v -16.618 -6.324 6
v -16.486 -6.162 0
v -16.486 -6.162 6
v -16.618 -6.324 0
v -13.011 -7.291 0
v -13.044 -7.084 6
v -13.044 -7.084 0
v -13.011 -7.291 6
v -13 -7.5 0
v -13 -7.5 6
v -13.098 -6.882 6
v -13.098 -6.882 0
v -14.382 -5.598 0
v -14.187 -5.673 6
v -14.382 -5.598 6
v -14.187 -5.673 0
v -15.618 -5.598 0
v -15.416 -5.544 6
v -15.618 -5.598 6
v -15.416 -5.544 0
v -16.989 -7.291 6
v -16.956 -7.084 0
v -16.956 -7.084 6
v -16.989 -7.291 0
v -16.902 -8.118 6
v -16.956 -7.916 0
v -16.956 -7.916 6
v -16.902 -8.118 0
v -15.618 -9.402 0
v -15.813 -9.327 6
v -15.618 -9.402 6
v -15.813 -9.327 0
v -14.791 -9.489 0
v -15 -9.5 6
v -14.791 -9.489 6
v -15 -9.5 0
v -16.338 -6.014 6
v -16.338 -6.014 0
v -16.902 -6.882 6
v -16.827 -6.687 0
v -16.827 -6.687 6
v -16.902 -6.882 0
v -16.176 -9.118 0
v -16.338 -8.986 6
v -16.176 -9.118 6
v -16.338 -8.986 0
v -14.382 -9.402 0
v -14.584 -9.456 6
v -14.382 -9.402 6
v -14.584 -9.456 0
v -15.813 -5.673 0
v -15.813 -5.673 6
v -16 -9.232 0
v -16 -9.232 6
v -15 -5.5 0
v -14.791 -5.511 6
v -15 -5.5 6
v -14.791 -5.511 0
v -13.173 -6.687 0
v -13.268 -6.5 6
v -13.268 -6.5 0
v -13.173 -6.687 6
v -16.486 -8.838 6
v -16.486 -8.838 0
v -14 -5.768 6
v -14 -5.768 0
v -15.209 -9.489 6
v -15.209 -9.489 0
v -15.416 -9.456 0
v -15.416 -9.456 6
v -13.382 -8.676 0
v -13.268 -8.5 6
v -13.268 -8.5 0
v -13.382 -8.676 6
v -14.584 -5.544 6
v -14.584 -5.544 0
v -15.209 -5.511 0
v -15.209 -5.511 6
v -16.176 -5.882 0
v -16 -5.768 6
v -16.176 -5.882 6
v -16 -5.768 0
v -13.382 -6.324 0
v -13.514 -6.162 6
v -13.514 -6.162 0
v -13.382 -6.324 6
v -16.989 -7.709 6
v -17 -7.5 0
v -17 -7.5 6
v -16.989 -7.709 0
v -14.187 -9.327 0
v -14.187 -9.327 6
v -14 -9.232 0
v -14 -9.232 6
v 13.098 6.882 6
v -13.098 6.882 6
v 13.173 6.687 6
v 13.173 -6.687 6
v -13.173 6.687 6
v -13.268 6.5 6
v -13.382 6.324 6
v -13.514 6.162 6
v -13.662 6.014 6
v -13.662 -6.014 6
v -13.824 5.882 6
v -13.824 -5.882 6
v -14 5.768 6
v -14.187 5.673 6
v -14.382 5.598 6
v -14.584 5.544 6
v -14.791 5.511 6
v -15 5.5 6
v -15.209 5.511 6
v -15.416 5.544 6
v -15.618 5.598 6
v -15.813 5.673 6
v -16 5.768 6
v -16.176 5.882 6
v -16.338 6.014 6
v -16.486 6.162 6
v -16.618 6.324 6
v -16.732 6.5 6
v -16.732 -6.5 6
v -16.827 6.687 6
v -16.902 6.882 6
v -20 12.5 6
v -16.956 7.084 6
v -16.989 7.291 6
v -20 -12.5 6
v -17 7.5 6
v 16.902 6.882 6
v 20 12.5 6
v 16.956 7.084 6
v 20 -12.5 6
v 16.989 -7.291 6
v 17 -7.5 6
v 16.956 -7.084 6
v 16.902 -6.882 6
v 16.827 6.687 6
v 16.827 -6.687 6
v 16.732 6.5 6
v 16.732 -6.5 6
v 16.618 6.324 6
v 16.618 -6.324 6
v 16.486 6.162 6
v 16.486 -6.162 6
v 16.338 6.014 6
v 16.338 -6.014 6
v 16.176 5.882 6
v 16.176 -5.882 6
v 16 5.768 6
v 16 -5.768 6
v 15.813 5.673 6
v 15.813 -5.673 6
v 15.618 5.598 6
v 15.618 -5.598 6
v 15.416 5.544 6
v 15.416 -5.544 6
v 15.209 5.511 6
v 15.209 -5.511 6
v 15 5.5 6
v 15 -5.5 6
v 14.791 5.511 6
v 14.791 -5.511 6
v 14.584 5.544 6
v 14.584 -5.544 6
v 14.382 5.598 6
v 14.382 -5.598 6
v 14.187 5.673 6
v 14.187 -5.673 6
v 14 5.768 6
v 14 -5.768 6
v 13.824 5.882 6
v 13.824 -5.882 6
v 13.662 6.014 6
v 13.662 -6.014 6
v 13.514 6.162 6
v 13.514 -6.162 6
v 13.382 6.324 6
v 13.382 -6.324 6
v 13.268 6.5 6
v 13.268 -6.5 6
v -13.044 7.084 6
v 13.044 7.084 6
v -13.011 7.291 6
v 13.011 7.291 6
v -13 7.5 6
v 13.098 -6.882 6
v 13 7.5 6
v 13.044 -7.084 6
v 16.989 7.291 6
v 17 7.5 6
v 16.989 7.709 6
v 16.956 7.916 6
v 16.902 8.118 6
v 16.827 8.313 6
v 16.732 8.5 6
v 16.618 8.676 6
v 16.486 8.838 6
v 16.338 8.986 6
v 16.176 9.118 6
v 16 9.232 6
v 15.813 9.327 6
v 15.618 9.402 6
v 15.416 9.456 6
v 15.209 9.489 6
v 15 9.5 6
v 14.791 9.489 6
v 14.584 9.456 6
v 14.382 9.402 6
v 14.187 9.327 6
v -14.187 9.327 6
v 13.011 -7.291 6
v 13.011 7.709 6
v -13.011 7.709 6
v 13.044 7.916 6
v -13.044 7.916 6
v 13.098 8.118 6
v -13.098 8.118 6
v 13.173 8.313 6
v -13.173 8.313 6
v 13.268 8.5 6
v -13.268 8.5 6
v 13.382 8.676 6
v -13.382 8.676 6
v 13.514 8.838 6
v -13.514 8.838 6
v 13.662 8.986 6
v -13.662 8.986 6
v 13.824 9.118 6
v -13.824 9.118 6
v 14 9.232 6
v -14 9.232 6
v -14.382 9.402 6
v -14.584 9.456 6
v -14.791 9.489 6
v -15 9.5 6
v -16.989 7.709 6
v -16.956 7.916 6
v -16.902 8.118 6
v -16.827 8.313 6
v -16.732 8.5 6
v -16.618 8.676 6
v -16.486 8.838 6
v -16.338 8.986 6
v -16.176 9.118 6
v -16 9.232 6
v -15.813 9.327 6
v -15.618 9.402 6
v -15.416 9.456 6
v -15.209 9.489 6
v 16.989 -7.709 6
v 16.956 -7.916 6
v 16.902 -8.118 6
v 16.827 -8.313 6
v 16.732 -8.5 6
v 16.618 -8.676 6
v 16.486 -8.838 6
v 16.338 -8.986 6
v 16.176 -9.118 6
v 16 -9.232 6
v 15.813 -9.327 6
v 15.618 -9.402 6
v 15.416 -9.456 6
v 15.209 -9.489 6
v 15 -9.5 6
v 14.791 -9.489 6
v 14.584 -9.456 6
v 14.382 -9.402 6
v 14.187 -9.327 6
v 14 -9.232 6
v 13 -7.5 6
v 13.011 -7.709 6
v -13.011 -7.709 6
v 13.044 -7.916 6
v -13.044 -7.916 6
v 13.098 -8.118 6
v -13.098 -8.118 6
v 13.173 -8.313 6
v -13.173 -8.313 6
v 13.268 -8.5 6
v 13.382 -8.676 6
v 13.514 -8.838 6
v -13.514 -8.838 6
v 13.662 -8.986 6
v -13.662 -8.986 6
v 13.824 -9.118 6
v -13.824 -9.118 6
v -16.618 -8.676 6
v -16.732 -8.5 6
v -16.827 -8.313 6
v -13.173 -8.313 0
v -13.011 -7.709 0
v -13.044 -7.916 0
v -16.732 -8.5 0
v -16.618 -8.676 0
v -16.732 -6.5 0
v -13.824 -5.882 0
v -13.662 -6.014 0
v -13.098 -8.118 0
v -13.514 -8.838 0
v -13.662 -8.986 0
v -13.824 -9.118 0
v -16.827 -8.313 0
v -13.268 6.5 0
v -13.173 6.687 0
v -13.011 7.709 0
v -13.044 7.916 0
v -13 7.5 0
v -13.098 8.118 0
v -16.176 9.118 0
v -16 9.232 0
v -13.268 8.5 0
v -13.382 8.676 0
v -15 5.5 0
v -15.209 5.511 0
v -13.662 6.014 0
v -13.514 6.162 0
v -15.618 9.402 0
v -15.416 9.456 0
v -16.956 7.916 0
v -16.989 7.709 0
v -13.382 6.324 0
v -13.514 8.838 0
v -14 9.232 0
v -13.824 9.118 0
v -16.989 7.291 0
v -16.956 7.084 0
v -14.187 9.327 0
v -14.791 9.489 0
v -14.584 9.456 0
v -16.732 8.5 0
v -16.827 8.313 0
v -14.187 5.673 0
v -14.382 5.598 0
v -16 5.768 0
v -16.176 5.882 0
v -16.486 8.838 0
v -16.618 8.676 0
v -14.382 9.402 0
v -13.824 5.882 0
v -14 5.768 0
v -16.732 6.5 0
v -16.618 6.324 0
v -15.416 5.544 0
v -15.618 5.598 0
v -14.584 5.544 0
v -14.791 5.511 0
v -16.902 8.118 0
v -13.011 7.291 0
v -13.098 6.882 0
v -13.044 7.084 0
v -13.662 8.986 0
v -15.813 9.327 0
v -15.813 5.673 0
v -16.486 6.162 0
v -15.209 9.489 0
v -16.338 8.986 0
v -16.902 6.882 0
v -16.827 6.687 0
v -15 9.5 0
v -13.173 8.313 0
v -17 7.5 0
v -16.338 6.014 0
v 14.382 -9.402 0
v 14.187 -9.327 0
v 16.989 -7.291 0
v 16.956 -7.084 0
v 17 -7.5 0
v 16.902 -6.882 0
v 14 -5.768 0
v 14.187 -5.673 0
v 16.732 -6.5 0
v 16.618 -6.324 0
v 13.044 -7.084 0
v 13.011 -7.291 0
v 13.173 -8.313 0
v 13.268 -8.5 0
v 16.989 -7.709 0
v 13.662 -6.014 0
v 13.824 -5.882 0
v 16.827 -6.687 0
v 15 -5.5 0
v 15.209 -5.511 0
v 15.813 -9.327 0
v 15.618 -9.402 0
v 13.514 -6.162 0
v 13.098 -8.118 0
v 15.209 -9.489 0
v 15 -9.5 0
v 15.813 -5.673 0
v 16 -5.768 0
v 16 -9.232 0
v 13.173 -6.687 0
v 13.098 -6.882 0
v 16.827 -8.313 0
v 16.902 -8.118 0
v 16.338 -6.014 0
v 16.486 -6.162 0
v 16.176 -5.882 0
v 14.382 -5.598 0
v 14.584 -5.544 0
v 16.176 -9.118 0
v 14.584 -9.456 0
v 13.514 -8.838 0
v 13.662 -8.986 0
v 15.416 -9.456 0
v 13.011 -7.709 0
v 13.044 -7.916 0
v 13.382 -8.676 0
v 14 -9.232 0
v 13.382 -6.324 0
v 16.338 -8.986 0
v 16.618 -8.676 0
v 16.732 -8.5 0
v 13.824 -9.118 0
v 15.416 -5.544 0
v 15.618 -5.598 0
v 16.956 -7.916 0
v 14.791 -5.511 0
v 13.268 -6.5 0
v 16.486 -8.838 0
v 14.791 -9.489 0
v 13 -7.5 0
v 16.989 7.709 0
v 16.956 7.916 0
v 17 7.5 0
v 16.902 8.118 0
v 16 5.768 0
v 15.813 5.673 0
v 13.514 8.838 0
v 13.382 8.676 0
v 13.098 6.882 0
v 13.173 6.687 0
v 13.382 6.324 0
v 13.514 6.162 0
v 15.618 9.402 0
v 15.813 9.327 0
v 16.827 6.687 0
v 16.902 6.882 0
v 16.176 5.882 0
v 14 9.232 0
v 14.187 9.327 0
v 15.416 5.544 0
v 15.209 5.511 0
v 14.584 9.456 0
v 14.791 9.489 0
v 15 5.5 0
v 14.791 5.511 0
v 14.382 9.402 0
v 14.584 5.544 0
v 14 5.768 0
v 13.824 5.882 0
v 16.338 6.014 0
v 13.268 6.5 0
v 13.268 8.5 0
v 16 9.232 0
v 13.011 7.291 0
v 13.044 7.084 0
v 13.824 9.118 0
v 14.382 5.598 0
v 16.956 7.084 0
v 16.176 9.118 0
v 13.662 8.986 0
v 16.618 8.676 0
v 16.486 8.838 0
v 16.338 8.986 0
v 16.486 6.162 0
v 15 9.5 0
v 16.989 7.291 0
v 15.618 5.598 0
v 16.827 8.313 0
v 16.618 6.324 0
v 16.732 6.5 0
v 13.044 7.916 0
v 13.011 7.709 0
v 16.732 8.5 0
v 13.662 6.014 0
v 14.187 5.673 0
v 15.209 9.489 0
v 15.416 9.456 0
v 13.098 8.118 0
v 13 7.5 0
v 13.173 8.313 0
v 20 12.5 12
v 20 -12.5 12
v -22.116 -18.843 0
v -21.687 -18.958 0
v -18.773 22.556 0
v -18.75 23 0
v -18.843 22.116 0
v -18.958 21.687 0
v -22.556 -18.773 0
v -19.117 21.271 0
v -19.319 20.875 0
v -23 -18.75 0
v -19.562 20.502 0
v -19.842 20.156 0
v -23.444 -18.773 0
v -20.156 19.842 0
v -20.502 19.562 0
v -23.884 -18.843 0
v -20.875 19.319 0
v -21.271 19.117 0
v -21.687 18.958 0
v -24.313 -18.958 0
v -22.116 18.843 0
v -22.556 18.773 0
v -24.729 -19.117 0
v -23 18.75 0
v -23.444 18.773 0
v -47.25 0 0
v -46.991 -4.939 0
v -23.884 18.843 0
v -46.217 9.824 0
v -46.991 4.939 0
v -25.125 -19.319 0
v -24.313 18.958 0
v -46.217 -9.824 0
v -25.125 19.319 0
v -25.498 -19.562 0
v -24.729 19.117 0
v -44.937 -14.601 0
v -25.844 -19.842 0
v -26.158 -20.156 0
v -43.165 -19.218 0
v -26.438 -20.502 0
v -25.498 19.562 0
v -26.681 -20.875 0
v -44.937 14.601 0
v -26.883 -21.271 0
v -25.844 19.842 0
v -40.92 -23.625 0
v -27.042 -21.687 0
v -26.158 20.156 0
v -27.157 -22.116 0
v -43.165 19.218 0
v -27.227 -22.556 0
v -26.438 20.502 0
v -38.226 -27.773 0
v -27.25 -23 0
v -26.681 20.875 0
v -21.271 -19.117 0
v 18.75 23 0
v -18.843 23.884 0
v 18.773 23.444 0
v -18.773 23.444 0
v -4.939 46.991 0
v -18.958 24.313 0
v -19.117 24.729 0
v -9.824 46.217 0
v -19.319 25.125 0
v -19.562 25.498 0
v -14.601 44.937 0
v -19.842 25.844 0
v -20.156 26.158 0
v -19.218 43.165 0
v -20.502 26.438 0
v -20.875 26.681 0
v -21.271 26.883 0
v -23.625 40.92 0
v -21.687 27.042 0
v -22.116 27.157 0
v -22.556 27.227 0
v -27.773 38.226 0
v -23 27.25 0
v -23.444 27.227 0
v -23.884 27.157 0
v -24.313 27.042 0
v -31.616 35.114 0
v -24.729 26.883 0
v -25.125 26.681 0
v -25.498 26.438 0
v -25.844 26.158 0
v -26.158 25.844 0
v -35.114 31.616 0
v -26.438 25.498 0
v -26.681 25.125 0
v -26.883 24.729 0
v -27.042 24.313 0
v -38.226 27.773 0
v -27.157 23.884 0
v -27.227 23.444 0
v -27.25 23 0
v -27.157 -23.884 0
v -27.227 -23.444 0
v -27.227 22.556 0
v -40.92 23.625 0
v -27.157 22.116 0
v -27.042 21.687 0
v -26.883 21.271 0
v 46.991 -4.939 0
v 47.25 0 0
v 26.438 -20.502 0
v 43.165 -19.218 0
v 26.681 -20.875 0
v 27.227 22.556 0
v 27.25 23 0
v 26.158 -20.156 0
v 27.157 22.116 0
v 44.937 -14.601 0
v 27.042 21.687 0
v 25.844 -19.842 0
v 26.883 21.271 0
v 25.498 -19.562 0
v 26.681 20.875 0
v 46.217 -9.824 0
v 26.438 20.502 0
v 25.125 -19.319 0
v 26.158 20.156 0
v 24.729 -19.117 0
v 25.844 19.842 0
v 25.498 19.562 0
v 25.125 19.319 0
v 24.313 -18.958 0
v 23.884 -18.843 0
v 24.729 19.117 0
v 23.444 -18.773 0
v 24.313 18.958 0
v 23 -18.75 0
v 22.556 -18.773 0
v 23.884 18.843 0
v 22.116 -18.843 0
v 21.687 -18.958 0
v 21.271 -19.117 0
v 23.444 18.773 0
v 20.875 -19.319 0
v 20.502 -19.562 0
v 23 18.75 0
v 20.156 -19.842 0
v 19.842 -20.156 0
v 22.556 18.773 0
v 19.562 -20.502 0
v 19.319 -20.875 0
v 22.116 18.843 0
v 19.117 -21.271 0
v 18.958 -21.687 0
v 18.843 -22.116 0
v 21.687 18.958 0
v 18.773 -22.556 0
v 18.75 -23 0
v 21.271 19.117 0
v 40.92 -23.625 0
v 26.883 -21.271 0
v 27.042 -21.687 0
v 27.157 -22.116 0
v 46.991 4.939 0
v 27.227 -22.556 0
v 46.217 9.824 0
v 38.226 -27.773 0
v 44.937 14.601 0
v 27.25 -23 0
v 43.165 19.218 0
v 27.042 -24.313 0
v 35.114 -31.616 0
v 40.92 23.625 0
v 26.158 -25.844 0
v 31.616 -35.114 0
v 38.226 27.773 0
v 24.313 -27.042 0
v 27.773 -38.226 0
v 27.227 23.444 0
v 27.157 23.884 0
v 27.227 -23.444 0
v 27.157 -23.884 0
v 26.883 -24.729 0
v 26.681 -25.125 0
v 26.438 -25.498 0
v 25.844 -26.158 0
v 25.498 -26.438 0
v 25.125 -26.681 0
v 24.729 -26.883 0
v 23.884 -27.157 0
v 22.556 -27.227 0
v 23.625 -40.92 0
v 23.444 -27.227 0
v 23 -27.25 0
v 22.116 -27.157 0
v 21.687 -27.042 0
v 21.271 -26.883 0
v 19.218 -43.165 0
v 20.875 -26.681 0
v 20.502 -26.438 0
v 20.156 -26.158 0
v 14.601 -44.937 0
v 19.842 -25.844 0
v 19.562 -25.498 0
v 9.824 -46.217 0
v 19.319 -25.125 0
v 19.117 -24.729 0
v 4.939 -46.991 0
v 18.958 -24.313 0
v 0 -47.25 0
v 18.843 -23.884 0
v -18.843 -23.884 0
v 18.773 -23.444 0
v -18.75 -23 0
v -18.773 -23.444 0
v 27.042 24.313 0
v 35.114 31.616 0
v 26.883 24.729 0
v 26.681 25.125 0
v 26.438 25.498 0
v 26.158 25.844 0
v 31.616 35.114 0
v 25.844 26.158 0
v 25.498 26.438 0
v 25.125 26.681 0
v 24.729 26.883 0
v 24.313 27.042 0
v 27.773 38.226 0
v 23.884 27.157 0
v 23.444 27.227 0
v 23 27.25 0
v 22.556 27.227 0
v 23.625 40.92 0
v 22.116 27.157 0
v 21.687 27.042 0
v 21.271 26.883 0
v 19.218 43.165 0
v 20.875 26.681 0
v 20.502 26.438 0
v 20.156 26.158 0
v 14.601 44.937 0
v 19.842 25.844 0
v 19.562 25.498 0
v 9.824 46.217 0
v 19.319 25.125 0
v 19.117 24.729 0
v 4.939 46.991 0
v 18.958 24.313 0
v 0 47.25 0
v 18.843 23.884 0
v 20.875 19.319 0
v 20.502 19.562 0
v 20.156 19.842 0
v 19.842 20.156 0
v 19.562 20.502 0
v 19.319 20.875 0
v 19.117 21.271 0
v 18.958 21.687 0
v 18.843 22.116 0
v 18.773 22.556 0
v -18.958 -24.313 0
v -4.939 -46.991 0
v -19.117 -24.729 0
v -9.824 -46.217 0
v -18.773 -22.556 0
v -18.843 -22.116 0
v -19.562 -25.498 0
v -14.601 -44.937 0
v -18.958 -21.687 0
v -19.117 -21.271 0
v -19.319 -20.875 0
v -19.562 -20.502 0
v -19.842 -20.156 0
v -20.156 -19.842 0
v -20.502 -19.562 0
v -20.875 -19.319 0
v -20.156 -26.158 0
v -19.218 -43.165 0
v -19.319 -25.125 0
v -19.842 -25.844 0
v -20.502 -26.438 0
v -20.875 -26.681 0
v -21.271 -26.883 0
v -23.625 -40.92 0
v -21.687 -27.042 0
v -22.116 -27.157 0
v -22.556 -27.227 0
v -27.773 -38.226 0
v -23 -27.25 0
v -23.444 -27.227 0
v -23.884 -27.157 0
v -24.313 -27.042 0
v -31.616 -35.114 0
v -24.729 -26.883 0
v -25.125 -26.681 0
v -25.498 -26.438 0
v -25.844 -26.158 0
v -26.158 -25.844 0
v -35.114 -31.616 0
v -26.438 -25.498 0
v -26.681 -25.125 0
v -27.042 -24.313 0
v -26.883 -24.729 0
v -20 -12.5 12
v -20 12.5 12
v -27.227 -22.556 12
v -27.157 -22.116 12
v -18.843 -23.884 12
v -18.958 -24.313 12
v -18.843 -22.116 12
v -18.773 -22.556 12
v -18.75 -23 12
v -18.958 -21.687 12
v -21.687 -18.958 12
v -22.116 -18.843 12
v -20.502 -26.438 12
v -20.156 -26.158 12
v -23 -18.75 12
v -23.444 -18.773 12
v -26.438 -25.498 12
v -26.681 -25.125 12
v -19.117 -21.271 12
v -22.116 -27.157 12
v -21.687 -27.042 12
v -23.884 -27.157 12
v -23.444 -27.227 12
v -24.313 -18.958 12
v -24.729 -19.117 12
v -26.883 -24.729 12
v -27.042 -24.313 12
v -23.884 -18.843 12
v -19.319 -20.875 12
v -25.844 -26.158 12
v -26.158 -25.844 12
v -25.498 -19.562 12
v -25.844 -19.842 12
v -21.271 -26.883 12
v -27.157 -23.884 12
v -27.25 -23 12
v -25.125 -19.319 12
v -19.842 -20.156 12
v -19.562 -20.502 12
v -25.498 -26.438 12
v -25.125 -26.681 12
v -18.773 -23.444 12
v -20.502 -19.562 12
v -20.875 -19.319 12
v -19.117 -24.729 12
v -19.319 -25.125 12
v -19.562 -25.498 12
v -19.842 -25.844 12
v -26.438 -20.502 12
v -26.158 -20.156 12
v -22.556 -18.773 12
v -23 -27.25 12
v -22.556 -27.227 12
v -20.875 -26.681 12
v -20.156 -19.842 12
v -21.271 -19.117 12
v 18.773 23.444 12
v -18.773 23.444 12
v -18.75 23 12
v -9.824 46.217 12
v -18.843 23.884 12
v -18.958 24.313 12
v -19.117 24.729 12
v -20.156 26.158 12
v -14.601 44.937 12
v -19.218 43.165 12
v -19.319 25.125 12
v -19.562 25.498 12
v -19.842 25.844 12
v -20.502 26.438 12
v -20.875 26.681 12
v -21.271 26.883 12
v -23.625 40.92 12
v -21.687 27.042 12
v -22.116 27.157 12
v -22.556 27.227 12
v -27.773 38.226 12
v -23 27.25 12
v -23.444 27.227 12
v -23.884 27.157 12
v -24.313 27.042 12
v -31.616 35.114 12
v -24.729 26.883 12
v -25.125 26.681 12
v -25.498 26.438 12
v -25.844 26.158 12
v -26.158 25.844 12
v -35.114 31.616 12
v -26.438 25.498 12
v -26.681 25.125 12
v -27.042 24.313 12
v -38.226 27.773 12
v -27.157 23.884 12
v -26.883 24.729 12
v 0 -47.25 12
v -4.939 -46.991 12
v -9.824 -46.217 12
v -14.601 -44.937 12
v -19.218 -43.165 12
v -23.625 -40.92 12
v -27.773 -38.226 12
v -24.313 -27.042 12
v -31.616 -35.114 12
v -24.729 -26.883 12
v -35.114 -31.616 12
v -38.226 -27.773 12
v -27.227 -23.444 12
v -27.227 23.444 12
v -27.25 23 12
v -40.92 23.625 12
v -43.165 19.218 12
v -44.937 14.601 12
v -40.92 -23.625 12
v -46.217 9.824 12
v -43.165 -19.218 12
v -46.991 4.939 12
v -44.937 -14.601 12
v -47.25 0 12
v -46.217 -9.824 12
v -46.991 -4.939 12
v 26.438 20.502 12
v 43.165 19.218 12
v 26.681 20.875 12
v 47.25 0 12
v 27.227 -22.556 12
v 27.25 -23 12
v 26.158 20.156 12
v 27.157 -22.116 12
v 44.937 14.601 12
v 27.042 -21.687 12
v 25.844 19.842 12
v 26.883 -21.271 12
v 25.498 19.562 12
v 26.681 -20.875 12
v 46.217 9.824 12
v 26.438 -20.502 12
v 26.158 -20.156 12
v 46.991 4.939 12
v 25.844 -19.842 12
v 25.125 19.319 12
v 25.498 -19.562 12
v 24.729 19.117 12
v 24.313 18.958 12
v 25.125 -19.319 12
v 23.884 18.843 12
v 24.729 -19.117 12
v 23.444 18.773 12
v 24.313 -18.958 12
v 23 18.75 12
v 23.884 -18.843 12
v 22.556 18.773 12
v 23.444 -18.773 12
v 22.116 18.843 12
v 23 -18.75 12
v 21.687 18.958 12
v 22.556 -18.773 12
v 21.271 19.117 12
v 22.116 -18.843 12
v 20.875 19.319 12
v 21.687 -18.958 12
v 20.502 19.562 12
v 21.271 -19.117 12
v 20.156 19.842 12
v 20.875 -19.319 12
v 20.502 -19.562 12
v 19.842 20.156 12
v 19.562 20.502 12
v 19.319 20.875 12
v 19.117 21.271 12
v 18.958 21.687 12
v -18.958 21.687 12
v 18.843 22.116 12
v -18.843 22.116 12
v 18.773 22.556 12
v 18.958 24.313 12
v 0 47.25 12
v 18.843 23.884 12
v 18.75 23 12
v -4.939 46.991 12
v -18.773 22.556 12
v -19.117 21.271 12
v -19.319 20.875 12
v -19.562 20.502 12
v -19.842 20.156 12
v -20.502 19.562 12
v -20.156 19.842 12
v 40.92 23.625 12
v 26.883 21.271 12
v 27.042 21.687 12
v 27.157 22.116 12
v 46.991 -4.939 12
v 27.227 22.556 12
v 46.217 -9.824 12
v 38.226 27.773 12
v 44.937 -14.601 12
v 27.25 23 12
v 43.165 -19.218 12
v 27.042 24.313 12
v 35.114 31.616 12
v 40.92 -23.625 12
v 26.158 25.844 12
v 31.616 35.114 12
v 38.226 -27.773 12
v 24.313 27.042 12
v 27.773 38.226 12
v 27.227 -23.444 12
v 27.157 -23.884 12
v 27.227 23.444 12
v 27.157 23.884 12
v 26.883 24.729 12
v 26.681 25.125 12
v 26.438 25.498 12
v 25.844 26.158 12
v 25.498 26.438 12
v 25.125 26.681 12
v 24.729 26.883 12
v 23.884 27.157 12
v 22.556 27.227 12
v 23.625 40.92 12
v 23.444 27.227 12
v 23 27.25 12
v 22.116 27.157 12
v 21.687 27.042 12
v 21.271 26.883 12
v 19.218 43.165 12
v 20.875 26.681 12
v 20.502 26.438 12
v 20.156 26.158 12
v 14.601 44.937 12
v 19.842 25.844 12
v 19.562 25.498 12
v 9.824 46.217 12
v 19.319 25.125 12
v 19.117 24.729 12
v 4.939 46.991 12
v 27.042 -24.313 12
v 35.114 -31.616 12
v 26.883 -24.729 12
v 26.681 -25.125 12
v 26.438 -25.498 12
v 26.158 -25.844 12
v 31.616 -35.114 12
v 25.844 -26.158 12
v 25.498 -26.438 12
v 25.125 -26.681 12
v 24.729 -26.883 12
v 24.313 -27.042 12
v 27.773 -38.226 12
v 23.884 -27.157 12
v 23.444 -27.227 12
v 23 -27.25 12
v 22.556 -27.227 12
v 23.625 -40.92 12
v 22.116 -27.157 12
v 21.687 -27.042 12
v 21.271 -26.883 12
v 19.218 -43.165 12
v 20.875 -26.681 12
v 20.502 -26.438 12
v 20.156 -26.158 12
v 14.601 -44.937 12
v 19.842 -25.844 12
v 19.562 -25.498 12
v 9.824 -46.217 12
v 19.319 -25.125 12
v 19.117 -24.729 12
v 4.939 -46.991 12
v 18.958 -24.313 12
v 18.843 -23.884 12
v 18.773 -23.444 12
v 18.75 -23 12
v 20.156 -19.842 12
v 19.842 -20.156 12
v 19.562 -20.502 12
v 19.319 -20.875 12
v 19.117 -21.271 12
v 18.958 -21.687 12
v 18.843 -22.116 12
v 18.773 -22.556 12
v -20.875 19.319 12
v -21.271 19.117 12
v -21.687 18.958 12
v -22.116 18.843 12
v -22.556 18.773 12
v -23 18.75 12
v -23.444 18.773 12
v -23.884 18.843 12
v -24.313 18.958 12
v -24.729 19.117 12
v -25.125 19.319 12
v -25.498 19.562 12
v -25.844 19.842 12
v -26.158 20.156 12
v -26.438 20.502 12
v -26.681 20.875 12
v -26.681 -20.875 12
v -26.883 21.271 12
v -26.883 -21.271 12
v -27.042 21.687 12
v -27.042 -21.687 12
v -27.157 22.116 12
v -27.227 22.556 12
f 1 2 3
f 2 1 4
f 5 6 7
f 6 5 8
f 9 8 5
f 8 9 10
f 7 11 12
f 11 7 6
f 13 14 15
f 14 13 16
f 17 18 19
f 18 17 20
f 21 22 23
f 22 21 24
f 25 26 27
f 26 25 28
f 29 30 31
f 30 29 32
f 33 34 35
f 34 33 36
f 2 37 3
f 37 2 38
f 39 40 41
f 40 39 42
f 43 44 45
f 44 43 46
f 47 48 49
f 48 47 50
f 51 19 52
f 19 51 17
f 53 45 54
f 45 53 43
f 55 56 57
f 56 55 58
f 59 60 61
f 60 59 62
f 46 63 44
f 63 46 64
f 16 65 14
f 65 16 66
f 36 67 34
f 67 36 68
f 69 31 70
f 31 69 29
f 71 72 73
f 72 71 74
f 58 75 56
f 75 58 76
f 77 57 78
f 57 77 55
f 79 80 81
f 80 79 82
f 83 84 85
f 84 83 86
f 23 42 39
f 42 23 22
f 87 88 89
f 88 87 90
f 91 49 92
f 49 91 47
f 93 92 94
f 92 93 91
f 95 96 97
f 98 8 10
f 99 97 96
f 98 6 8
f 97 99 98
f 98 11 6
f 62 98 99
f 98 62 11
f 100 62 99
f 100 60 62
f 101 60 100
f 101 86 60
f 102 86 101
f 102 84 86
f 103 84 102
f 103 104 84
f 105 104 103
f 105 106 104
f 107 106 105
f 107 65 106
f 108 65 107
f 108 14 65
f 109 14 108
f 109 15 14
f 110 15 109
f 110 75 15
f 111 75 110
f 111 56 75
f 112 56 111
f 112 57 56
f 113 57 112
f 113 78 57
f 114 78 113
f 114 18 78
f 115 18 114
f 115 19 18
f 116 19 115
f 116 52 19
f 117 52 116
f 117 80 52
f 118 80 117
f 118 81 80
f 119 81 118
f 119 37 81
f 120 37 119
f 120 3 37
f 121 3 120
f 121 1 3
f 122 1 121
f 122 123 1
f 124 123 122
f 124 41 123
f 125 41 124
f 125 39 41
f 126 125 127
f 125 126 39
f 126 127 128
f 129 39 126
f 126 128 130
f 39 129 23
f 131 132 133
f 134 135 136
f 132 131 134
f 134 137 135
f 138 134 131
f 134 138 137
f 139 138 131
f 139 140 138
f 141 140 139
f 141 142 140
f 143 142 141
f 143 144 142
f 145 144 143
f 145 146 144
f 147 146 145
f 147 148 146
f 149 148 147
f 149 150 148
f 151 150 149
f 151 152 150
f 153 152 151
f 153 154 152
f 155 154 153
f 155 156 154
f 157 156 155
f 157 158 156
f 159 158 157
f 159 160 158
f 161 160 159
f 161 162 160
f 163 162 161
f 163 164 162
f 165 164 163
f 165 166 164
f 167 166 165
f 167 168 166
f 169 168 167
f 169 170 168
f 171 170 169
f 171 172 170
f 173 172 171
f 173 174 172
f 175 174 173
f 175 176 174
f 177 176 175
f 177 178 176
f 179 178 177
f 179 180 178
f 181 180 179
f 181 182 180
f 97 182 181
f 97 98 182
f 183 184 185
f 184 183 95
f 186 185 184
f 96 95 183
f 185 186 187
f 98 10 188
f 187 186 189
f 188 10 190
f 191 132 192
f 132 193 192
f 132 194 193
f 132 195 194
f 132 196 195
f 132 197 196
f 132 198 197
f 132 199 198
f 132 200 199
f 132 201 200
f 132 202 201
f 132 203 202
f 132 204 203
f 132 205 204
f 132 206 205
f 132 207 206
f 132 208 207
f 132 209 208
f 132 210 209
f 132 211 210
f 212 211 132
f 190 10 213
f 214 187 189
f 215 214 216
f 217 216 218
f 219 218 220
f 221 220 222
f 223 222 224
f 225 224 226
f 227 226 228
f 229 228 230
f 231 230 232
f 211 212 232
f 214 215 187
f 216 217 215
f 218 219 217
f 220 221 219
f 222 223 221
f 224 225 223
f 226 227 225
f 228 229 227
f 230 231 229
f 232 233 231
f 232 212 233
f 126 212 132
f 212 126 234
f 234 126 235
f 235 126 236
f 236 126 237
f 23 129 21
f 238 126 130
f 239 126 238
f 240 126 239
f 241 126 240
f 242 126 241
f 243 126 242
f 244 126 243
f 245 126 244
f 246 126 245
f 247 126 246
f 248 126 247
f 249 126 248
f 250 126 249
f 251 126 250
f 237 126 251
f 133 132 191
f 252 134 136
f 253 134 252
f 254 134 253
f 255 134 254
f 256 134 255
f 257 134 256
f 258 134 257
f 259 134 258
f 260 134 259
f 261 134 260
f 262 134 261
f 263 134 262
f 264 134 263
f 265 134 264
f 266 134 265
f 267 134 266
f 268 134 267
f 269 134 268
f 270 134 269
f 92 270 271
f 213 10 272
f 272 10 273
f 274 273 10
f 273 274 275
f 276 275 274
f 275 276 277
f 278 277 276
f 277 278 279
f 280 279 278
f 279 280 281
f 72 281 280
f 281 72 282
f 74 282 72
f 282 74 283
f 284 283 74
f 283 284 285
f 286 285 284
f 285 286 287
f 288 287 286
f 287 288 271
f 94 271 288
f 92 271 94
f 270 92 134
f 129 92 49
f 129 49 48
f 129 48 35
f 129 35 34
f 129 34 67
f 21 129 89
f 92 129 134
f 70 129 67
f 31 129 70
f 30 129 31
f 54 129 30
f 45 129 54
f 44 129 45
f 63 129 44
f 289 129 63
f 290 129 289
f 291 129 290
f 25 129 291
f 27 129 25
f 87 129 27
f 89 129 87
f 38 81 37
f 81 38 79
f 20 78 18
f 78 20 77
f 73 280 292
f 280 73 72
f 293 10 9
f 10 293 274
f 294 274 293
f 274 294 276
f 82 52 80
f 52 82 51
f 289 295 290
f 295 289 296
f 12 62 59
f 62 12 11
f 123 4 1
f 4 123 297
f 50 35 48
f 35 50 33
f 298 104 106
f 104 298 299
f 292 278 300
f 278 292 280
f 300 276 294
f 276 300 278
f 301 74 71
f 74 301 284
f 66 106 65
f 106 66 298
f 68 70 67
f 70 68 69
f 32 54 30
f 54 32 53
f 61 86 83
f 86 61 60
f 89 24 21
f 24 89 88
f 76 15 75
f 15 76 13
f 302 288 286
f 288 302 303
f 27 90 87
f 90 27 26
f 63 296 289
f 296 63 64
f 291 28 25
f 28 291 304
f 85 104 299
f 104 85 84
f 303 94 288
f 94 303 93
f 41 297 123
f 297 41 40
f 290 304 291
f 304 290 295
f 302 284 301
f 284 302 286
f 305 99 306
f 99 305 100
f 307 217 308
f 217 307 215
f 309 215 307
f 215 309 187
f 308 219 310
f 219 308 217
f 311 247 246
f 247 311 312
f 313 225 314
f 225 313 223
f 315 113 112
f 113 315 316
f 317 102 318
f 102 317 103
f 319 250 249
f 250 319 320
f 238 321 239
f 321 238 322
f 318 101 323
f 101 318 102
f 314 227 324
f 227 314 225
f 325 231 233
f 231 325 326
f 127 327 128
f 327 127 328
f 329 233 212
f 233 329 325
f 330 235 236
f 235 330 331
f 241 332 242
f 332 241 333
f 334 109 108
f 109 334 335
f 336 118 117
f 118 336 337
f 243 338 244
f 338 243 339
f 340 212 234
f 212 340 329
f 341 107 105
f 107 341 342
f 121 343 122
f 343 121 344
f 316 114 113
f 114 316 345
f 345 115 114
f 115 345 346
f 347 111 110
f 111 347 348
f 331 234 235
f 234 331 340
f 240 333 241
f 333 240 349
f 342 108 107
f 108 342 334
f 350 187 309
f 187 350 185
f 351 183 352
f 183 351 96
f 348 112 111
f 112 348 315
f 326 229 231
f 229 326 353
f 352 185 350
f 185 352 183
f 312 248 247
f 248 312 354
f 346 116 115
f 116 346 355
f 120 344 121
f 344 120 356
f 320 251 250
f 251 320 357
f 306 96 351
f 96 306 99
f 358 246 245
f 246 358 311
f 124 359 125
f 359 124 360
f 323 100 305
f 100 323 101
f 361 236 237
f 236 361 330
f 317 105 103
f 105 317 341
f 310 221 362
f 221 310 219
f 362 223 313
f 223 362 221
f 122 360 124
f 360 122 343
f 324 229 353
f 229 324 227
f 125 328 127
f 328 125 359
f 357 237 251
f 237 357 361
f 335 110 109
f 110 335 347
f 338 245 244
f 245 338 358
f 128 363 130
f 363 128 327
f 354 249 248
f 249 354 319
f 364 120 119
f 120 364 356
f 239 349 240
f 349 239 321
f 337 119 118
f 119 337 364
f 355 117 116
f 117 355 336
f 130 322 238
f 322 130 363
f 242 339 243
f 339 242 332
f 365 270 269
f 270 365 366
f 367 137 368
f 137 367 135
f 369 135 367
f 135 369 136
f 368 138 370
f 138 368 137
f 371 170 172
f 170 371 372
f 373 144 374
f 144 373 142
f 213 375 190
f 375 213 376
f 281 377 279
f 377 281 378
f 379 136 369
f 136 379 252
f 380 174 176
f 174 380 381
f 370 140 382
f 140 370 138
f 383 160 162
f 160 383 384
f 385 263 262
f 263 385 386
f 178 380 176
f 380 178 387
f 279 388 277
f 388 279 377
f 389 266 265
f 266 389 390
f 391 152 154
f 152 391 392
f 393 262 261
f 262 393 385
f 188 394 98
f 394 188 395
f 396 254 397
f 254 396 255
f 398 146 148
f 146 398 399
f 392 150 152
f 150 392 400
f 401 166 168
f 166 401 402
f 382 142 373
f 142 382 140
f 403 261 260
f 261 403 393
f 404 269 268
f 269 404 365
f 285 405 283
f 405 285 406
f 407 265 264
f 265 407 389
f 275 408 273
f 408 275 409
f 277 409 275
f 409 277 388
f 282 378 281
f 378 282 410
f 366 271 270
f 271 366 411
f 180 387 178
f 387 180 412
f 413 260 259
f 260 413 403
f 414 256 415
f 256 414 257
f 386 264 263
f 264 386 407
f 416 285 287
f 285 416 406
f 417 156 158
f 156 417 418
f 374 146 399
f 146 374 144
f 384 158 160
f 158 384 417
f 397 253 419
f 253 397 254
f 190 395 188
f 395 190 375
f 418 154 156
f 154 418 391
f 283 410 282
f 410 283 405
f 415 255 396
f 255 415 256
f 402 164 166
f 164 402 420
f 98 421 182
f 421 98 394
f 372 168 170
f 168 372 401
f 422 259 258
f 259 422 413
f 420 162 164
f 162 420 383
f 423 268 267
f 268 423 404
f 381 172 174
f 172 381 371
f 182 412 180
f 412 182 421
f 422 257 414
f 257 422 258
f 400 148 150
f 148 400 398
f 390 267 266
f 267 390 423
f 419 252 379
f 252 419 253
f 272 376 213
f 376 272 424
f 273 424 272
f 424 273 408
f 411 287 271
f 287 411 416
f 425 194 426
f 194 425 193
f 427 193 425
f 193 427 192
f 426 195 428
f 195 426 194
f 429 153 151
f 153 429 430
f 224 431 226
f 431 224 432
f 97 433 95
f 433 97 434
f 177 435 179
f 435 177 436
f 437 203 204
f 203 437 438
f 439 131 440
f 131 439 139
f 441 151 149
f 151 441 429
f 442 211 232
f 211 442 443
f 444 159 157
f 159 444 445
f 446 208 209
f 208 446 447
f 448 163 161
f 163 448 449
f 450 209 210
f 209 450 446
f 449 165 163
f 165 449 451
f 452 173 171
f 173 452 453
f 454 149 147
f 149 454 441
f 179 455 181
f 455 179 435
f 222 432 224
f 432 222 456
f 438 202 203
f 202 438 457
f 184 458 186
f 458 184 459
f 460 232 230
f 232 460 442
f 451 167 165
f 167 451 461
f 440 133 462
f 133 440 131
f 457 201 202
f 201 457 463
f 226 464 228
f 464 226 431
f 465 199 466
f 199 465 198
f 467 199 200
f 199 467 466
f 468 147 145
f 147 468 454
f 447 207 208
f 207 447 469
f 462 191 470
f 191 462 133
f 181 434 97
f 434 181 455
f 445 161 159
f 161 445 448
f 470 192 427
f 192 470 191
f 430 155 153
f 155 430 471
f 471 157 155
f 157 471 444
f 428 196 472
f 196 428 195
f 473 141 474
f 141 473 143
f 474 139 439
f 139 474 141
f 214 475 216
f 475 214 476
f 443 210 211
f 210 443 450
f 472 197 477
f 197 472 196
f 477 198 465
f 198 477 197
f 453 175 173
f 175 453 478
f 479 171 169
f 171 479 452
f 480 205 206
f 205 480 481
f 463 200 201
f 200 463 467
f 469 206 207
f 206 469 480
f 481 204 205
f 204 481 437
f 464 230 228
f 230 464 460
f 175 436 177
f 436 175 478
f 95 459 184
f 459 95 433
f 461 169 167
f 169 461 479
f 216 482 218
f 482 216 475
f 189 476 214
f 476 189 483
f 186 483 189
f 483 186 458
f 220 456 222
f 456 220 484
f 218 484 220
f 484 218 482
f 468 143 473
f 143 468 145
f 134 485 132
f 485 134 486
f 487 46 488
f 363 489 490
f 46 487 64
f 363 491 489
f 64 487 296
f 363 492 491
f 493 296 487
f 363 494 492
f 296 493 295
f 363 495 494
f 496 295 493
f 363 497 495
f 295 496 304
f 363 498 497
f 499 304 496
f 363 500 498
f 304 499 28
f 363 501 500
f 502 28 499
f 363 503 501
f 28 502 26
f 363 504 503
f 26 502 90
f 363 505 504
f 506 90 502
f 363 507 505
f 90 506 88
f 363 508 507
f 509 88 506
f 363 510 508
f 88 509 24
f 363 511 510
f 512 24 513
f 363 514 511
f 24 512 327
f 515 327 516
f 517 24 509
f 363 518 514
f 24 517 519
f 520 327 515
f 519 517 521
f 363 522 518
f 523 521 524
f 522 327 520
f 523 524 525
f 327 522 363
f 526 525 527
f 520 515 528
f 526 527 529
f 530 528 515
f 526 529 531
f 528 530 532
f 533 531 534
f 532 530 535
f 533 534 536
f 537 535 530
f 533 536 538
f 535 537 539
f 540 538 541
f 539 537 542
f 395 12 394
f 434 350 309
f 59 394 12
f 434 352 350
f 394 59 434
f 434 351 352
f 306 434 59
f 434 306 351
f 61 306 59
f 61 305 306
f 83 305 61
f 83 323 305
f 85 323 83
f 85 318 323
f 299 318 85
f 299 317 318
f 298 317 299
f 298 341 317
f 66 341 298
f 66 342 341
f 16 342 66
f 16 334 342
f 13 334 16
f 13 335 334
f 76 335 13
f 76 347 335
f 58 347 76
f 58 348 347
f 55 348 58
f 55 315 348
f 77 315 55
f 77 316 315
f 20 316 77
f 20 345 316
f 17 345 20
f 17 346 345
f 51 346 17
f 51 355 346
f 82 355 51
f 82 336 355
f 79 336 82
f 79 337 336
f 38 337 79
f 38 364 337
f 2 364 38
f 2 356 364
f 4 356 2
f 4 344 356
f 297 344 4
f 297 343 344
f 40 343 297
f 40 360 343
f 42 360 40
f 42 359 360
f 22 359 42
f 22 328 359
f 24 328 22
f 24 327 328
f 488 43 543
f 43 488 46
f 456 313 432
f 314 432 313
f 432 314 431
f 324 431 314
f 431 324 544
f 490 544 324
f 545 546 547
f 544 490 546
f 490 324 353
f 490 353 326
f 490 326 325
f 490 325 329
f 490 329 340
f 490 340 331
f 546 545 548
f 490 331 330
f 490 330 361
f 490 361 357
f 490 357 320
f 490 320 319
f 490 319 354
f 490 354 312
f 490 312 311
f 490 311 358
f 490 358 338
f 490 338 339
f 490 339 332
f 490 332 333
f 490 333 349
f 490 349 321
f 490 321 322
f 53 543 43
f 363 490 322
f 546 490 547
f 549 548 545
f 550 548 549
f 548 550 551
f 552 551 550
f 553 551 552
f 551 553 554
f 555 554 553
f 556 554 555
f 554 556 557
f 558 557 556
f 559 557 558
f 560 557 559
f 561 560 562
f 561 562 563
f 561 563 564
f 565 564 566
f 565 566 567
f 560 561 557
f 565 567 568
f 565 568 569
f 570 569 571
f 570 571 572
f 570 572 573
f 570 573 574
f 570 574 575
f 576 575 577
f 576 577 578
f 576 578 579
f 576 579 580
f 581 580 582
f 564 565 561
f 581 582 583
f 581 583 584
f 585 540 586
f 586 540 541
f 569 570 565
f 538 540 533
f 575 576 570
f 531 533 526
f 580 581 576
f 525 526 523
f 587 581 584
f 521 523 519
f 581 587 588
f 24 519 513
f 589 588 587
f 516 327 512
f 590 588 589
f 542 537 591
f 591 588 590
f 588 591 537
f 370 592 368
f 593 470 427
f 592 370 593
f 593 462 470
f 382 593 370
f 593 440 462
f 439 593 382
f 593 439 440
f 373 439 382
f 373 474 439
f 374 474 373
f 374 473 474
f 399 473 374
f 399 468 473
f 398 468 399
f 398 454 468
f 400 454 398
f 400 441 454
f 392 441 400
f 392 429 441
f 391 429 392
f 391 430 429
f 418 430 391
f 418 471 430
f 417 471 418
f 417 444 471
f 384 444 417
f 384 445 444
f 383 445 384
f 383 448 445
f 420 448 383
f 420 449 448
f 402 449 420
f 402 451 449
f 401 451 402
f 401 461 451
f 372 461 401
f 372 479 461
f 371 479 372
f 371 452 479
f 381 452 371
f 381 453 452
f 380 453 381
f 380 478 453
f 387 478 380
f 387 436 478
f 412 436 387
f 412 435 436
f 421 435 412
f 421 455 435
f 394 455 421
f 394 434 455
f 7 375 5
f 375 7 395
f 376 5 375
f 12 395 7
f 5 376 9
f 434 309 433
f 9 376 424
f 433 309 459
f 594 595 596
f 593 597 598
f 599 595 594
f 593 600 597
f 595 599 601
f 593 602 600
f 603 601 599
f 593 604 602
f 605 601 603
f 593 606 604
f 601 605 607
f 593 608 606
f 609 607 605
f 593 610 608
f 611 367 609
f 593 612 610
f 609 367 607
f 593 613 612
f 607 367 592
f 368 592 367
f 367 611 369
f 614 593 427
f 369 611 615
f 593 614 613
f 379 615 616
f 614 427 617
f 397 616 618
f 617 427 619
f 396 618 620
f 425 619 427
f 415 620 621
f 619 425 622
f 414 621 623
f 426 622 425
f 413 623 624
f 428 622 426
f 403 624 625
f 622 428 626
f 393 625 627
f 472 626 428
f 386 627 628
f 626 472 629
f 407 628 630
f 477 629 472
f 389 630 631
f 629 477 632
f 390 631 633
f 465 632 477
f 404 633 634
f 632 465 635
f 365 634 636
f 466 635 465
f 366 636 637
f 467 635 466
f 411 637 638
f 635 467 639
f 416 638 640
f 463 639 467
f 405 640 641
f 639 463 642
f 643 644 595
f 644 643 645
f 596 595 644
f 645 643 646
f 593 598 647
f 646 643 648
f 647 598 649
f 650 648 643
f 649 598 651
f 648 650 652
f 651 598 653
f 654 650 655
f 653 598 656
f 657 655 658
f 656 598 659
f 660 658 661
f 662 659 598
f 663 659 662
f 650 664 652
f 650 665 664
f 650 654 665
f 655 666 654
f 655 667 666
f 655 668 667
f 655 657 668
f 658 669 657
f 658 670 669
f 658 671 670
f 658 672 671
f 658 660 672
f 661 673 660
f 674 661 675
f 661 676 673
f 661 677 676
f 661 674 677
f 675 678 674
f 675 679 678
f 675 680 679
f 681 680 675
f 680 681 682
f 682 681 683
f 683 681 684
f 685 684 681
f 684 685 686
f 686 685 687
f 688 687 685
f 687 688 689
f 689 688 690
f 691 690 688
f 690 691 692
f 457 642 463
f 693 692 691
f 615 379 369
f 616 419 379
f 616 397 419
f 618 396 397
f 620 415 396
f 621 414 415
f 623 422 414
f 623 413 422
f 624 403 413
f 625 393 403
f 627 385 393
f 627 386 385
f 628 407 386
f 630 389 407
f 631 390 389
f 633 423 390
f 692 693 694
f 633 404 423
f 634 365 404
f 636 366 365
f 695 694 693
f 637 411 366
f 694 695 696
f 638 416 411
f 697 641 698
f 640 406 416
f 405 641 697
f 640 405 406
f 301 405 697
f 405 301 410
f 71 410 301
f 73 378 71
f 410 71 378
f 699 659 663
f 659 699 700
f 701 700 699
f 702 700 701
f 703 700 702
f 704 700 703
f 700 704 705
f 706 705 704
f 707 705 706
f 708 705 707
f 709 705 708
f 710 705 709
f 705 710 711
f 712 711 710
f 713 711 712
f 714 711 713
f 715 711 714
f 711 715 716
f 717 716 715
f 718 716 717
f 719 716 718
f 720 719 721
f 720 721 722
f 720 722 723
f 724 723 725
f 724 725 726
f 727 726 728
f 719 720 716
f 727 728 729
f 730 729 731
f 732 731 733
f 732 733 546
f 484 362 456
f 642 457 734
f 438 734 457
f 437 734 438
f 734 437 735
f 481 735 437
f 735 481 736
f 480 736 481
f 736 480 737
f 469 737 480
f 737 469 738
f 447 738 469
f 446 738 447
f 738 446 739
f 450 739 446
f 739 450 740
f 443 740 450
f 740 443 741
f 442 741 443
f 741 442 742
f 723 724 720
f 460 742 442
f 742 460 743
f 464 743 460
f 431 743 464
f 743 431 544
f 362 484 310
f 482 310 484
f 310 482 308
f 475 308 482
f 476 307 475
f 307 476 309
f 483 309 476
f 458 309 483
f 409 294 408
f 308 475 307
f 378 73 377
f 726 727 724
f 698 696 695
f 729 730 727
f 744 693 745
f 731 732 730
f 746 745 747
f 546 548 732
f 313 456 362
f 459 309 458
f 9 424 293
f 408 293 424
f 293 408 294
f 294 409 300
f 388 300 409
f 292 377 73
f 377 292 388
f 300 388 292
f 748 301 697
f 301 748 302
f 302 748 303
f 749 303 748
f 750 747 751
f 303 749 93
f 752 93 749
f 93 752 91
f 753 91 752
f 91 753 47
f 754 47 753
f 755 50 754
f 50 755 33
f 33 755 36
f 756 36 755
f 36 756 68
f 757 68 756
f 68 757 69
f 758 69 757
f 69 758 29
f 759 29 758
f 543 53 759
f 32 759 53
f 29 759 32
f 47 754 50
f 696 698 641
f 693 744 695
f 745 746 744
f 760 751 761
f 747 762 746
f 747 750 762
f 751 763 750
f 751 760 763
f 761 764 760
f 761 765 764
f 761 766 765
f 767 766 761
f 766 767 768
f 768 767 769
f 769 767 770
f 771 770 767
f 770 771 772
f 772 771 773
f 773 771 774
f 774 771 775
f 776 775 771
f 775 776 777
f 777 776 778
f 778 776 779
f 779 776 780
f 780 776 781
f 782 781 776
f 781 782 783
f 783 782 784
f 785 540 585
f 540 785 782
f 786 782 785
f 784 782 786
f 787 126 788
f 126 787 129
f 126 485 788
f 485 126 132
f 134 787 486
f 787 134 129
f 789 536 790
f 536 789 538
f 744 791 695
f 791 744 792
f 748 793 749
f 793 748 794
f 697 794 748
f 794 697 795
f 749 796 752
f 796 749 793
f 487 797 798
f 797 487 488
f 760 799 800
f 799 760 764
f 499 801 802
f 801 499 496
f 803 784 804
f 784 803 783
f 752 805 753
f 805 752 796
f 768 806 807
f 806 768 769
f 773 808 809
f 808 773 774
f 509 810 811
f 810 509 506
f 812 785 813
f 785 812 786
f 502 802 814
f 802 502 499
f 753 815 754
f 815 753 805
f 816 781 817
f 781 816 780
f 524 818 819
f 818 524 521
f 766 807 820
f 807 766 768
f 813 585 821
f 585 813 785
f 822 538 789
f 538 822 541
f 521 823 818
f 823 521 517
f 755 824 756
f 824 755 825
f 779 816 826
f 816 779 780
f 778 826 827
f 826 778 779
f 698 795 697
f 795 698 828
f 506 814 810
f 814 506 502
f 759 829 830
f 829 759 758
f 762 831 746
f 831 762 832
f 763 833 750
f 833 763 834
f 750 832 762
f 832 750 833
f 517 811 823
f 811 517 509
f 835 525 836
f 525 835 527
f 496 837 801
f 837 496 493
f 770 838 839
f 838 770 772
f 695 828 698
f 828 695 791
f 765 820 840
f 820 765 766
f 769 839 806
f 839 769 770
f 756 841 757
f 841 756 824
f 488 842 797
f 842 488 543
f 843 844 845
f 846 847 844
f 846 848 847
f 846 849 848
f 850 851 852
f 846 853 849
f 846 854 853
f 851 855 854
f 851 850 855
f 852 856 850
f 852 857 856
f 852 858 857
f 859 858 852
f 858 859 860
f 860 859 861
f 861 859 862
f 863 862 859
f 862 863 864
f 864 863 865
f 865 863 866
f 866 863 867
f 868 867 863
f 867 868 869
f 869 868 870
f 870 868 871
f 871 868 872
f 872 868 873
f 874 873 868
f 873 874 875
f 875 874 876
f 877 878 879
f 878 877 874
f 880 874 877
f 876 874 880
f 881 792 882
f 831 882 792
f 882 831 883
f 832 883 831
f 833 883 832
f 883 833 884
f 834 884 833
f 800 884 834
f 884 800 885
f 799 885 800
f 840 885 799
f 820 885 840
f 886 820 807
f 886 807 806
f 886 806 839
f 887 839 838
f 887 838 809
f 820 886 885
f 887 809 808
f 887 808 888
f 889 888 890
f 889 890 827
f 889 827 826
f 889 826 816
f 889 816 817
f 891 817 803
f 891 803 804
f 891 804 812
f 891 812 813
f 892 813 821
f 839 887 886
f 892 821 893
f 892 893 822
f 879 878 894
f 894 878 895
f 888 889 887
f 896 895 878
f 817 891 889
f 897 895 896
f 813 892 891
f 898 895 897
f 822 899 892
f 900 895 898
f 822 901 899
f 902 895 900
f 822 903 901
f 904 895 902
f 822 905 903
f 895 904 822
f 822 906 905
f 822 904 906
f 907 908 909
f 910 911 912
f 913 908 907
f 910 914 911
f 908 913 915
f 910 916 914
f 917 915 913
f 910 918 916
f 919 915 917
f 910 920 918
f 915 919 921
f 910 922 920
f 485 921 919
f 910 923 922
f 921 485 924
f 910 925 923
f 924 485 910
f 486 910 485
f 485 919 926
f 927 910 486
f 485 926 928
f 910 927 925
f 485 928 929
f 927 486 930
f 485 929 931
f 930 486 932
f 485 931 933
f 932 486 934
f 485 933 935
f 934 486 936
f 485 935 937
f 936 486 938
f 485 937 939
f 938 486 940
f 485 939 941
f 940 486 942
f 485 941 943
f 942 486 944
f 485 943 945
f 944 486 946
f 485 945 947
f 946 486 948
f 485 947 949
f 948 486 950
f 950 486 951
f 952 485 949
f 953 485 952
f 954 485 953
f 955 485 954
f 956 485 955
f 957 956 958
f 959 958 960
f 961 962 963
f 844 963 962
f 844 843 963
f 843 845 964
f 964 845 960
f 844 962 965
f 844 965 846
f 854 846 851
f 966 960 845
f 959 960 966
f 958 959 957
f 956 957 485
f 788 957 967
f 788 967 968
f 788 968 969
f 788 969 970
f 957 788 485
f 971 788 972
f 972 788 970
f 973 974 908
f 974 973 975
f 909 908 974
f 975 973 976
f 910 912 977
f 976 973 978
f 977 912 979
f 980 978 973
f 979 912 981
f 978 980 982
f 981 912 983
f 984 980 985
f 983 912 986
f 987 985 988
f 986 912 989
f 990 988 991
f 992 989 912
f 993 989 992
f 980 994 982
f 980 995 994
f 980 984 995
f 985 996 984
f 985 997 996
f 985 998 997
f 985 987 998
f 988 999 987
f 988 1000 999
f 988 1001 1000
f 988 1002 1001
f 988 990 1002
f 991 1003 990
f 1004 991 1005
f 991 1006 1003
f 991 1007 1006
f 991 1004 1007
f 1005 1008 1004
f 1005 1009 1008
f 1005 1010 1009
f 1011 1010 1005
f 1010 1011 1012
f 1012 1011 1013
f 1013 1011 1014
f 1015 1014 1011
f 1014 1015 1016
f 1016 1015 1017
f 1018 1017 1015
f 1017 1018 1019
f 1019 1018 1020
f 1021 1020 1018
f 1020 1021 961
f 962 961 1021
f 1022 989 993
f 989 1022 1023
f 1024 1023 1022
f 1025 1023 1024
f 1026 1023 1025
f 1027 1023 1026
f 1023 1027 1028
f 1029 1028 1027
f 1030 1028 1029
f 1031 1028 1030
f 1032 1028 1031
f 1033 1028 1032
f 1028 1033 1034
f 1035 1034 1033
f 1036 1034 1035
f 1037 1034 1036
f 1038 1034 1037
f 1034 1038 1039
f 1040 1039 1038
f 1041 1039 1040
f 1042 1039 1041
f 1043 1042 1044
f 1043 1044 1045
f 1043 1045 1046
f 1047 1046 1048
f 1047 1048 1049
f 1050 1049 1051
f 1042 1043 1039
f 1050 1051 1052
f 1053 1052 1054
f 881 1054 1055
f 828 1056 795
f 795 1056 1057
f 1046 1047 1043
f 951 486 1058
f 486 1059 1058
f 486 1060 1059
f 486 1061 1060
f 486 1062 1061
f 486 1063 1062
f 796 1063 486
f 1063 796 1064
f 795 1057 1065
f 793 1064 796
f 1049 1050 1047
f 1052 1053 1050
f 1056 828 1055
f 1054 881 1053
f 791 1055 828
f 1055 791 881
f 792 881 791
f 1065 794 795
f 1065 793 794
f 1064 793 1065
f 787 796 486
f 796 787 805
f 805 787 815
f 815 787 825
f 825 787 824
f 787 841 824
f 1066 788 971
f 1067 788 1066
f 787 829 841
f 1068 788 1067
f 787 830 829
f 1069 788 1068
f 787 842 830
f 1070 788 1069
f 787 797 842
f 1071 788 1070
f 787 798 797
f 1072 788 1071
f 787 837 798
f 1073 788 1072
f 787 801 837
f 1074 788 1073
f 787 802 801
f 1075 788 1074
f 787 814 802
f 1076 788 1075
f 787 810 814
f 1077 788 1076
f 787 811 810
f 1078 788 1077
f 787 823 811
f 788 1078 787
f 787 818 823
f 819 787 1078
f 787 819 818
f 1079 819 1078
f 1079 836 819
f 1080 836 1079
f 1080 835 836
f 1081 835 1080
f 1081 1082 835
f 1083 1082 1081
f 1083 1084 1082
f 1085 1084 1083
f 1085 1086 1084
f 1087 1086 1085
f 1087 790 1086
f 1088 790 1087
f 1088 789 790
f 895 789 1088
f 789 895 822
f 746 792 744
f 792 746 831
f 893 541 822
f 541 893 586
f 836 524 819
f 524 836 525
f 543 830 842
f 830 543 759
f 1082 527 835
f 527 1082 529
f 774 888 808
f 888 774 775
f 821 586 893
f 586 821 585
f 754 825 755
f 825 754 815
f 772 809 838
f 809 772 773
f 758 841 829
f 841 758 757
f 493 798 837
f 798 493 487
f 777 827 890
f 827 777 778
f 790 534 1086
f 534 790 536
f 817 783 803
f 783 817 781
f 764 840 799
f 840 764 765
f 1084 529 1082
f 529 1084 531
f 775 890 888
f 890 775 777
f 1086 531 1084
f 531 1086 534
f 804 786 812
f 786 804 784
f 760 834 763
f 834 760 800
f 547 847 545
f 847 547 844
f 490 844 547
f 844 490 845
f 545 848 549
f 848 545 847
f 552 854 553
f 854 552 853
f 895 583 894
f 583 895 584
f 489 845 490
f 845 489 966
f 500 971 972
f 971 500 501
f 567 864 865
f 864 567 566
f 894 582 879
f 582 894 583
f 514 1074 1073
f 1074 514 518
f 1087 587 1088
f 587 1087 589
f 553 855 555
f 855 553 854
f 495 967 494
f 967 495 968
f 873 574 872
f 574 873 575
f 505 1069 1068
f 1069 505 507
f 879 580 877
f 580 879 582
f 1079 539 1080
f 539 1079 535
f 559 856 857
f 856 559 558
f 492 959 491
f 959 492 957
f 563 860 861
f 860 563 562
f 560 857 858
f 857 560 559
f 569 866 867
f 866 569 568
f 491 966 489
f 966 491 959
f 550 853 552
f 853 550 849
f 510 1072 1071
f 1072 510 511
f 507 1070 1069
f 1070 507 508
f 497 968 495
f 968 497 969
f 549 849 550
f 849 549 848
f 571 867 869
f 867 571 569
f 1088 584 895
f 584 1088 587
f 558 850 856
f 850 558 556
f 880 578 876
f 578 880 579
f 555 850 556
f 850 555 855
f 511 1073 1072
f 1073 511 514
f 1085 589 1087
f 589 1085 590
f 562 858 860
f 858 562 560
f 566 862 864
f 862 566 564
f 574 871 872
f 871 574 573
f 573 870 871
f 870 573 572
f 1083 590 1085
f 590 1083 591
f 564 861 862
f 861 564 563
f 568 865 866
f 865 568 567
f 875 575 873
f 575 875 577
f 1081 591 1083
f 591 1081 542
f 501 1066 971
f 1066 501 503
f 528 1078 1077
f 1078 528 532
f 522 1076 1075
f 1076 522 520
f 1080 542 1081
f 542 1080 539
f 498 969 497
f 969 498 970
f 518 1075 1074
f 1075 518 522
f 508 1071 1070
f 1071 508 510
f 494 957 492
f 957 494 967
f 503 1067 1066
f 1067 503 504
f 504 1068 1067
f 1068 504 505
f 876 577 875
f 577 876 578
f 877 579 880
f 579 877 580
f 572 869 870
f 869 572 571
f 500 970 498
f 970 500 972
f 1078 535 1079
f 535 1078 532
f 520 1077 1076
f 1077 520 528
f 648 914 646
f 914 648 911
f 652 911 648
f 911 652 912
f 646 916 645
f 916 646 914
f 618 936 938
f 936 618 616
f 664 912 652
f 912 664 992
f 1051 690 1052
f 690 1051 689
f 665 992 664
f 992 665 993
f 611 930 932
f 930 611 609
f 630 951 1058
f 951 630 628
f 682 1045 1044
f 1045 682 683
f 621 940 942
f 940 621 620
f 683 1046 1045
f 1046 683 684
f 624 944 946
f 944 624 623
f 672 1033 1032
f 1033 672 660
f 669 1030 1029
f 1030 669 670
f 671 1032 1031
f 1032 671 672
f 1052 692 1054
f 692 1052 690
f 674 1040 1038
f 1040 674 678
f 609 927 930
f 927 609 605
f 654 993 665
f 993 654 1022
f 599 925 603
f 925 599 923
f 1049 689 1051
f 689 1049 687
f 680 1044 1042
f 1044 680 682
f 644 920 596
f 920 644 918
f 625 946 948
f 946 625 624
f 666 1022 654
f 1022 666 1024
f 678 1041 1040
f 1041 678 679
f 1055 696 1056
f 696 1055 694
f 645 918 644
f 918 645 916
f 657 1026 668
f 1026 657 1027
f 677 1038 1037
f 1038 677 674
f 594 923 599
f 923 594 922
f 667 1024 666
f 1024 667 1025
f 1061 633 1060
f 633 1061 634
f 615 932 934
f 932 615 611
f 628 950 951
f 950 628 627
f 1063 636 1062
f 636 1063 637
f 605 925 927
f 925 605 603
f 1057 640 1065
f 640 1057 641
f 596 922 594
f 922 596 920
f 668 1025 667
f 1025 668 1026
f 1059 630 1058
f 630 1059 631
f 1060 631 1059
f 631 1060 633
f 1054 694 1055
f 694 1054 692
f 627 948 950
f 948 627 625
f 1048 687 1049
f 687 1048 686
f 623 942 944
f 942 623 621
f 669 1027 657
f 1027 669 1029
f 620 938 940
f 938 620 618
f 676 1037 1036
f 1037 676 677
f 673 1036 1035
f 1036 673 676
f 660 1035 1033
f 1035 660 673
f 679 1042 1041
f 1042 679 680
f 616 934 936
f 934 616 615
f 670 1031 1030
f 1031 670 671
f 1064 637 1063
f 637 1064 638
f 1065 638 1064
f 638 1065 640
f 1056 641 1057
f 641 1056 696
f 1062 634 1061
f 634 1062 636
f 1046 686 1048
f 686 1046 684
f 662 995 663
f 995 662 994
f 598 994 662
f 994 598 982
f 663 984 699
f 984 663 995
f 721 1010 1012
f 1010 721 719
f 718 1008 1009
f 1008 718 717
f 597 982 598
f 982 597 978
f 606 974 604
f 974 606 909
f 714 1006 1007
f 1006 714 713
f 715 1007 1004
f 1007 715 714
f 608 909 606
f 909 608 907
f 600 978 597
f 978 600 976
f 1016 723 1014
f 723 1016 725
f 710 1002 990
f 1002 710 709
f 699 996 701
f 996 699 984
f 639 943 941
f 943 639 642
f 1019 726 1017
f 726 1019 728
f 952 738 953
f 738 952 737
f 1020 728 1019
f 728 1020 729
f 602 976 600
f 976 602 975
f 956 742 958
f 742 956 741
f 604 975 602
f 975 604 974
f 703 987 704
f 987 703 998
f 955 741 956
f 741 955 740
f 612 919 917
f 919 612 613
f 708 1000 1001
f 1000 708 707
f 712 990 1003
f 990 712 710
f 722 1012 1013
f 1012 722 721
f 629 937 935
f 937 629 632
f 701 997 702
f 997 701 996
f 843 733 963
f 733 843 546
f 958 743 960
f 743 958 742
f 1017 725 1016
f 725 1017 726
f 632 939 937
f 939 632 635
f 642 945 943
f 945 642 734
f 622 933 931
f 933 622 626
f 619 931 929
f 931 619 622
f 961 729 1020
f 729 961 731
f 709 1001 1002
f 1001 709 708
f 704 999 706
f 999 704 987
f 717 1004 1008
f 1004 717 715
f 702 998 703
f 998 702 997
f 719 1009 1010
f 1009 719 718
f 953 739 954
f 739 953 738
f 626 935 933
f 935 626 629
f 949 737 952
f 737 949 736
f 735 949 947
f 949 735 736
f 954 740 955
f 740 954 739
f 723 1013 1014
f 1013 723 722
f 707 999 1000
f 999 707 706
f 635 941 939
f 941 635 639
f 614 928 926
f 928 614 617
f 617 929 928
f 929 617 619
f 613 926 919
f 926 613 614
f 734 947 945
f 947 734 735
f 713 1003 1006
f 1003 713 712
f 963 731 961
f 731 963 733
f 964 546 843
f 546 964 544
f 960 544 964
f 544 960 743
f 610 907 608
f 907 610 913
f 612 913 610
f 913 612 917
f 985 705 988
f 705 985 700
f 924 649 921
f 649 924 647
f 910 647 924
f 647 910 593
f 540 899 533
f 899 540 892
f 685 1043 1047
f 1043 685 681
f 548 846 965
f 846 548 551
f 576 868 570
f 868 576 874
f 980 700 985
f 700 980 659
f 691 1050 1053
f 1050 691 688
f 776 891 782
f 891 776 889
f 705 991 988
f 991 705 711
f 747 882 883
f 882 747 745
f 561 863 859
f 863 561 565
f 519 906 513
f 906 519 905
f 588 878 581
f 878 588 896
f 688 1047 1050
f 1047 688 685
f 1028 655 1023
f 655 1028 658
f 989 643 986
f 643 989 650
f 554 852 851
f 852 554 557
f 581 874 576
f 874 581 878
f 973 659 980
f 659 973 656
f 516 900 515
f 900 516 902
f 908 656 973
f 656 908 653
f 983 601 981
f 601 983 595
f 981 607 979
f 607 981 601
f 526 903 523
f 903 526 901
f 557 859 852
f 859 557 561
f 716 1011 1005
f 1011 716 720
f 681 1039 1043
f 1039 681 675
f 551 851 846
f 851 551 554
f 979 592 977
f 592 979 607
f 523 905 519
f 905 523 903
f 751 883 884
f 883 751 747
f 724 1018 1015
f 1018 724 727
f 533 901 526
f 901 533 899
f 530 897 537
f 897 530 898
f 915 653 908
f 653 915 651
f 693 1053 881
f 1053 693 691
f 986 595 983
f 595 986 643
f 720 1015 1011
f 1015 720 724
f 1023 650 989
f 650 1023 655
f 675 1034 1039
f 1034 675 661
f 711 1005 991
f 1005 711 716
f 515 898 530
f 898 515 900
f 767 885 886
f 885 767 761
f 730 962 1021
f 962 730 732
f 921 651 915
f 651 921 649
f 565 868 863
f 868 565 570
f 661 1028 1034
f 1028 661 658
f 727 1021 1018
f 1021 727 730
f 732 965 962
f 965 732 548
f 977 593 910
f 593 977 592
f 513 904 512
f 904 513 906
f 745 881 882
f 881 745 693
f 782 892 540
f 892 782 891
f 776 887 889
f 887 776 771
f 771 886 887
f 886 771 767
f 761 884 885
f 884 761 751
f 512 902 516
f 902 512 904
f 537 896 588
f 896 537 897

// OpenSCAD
$fn = 60;

// The hole radius for the screws
hole_radius = 2;

hole_x_dist = 30;
hole_y_dist = 15;

plate_width = 40;
plate_depth = 25;
plate_height = 6;

mounting_width = 47.25;
mounting_height = 12;

mounting_hole_radius = 4.25;
mounting_hole_x_dist = 46;
mounting_hole_y_dist = 46;

module corner_holes(x_dist, y_dist, radius, depth){
    for(i = [0:1]){
        for(j = [0:1]){
            translate([i * x_dist - x_dist / 2, j * y_dist - y_dist / 2, 0])
            cylinder(depth, r1=radius, r2=radius, center=true);
        }
    }
}

difference(){
    // Create plate
    translate([-plate_width/2, -plate_depth/2, 0])
    cube([plate_width, plate_depth, plate_height]);

    corner_holes(hole_x_dist, hole_y_dist, hole_radius, plate_height * 2);
}


// Mounting plate
difference(){
    translate([0, 0, mounting_height/2])
    cylinder(mounting_height, r1=mounting_width, r2=mounting_width, center=true);
    
    // Inner plate
    translate([-plate_width/2, -plate_depth/2, 0])
    cube([plate_width, plate_depth, mounting_height]);
    
    corner_holes(mounting_hole_x_dist, mounting_hole_y_dist, mounting_hole_radius, mounting_height * 2);
}
